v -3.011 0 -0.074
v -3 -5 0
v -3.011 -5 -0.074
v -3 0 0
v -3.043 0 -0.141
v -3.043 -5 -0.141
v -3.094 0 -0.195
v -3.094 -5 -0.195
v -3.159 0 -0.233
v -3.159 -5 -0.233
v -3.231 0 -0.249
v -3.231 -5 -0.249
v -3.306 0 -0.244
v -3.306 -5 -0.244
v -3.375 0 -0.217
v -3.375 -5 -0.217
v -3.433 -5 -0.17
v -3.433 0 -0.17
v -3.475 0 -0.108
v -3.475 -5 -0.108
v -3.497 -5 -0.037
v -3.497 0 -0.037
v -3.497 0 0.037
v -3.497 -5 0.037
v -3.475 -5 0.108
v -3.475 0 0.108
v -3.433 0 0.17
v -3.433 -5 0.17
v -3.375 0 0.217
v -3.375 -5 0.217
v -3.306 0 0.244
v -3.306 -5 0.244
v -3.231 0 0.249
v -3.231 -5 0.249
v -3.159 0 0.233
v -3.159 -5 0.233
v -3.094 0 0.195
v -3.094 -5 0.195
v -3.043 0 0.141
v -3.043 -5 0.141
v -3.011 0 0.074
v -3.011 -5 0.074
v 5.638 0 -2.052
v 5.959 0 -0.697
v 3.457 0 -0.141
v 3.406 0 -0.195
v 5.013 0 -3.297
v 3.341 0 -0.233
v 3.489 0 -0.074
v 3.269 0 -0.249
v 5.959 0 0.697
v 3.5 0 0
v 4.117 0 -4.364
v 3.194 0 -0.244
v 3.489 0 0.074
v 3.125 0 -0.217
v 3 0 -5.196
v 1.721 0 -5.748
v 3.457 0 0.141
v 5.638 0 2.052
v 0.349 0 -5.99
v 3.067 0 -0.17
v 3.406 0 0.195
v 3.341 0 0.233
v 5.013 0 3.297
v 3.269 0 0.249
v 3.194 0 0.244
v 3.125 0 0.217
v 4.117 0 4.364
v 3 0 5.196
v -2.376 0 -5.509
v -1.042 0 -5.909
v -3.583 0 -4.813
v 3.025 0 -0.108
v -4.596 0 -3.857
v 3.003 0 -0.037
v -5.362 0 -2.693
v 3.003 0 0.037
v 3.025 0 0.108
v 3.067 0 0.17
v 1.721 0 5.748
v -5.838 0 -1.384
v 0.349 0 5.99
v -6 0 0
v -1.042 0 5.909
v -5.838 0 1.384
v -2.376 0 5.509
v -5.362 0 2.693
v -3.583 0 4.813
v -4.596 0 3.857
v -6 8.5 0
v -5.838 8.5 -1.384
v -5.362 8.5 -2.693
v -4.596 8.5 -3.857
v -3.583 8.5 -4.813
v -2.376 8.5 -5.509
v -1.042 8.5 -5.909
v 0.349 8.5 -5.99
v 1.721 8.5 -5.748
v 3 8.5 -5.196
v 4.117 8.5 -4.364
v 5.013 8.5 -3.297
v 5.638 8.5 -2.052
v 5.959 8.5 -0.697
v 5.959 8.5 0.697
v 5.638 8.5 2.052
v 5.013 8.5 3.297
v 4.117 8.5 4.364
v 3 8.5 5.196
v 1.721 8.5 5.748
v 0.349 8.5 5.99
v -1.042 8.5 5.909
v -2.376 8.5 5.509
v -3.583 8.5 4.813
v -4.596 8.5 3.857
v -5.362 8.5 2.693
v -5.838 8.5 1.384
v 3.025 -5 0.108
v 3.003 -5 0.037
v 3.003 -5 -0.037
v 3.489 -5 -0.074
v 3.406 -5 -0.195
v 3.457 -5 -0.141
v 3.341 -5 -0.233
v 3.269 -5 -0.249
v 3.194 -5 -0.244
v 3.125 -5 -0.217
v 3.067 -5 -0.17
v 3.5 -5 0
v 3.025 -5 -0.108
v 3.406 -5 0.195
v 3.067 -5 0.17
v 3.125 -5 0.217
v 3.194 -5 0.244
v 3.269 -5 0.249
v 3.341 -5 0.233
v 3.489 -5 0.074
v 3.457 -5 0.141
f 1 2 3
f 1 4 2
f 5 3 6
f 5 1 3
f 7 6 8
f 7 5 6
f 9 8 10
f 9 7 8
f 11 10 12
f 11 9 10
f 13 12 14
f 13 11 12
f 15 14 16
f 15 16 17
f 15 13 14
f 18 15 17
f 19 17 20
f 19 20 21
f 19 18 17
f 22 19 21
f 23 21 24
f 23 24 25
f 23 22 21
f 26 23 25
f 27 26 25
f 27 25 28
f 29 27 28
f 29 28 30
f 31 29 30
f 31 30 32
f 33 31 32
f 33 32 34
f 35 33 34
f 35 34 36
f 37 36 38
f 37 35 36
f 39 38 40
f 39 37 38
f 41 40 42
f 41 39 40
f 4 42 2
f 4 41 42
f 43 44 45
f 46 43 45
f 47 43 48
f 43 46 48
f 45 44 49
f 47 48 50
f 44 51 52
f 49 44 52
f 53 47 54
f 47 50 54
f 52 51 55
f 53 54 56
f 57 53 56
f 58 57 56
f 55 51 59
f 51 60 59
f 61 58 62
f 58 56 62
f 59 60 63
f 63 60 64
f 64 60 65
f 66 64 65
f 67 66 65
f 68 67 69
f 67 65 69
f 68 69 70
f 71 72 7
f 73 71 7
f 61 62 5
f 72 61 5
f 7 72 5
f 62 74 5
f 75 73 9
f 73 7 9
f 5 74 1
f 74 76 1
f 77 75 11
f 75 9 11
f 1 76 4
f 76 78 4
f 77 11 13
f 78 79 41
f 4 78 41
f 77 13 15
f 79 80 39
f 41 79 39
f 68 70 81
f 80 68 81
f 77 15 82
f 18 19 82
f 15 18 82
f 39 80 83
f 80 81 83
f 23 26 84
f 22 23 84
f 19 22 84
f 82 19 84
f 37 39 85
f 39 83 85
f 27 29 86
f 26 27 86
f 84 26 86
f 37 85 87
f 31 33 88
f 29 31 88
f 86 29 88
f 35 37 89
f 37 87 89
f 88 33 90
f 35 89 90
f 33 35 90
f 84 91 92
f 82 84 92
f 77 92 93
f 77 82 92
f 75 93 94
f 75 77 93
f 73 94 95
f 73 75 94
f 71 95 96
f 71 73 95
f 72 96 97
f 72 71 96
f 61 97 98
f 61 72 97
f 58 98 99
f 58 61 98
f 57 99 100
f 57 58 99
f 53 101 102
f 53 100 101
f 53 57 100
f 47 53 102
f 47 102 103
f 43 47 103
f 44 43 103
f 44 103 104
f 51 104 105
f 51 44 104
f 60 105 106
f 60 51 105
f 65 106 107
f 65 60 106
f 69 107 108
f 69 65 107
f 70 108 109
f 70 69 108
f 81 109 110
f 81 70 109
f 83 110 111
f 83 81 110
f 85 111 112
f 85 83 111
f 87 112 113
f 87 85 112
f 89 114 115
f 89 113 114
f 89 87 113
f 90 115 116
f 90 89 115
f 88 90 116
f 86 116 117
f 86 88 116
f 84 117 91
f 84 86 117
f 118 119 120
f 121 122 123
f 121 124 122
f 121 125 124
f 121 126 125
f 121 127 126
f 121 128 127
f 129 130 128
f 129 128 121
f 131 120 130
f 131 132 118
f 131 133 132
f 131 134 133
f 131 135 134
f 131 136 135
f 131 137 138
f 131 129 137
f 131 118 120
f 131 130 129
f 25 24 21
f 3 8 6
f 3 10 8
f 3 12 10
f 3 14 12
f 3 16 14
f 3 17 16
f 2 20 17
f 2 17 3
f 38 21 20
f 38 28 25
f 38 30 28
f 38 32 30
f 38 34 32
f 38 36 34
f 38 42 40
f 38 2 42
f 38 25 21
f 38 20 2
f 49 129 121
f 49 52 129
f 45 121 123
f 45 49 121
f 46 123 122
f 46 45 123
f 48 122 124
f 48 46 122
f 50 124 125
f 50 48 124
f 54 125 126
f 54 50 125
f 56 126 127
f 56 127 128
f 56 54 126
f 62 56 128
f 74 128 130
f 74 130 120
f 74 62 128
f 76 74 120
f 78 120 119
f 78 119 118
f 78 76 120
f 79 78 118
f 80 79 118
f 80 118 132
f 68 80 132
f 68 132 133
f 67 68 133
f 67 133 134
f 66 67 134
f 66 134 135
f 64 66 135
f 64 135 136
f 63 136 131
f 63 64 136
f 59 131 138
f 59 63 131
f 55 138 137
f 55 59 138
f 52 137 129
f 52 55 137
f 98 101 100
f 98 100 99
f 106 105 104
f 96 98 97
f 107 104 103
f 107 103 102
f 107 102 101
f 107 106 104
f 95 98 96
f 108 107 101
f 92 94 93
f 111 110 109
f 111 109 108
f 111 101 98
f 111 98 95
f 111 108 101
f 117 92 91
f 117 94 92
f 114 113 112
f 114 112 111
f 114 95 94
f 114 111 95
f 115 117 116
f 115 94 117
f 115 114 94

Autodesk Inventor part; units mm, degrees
ref_plane "YZ Plane" through (0, 0, 0) normal (1, 0, 0) x (0, 1, 0)
ref_plane "XZ Plane" through (0, 0, 0) normal (0, 1, 0) x (-1, 0, 0)
ref_plane "XY Plane" through (0, 0, 0) normal (0, 0, 1) x (1, 0, 0)
sketch "スケッチ1" plane through (0, 0, 0) normal (0, 1, 0) x (-1, 0, 0)
  circle A0 centre (0, 0) radius 6
  dimension "d0" = 12
extrude "押し出し1" add sketch "スケッチ1" along normal blind 8.5
sketch "スケッチ2" plane through (0, 0, 0) normal (0, -1, 0) x (1, 0, 0)
  circle A0 centre (0, 0) radius 3.25
  line L0 (-5.9563, 0) -> (5.7903, 0)
  circle A1 centre (-3.25, 0) radius 0.25
  circle A2 centre (3.25, 0) radius 0.25
  dimension "d3" = 6.5
  dimension "d4" = 0.5
  dimension "d5" = 0.5
extrude "押し出し2" add sketch "スケッチ2" along normal blind 5 contours L0 A2 A0 | L0 A2 A0 | A0 A2 L0 | A0 A2 L0 | A1 L0 A0 | A0 L0 A1 | A1 L0 A0 | A0 L0 A1
properties part number "Buzzer"
